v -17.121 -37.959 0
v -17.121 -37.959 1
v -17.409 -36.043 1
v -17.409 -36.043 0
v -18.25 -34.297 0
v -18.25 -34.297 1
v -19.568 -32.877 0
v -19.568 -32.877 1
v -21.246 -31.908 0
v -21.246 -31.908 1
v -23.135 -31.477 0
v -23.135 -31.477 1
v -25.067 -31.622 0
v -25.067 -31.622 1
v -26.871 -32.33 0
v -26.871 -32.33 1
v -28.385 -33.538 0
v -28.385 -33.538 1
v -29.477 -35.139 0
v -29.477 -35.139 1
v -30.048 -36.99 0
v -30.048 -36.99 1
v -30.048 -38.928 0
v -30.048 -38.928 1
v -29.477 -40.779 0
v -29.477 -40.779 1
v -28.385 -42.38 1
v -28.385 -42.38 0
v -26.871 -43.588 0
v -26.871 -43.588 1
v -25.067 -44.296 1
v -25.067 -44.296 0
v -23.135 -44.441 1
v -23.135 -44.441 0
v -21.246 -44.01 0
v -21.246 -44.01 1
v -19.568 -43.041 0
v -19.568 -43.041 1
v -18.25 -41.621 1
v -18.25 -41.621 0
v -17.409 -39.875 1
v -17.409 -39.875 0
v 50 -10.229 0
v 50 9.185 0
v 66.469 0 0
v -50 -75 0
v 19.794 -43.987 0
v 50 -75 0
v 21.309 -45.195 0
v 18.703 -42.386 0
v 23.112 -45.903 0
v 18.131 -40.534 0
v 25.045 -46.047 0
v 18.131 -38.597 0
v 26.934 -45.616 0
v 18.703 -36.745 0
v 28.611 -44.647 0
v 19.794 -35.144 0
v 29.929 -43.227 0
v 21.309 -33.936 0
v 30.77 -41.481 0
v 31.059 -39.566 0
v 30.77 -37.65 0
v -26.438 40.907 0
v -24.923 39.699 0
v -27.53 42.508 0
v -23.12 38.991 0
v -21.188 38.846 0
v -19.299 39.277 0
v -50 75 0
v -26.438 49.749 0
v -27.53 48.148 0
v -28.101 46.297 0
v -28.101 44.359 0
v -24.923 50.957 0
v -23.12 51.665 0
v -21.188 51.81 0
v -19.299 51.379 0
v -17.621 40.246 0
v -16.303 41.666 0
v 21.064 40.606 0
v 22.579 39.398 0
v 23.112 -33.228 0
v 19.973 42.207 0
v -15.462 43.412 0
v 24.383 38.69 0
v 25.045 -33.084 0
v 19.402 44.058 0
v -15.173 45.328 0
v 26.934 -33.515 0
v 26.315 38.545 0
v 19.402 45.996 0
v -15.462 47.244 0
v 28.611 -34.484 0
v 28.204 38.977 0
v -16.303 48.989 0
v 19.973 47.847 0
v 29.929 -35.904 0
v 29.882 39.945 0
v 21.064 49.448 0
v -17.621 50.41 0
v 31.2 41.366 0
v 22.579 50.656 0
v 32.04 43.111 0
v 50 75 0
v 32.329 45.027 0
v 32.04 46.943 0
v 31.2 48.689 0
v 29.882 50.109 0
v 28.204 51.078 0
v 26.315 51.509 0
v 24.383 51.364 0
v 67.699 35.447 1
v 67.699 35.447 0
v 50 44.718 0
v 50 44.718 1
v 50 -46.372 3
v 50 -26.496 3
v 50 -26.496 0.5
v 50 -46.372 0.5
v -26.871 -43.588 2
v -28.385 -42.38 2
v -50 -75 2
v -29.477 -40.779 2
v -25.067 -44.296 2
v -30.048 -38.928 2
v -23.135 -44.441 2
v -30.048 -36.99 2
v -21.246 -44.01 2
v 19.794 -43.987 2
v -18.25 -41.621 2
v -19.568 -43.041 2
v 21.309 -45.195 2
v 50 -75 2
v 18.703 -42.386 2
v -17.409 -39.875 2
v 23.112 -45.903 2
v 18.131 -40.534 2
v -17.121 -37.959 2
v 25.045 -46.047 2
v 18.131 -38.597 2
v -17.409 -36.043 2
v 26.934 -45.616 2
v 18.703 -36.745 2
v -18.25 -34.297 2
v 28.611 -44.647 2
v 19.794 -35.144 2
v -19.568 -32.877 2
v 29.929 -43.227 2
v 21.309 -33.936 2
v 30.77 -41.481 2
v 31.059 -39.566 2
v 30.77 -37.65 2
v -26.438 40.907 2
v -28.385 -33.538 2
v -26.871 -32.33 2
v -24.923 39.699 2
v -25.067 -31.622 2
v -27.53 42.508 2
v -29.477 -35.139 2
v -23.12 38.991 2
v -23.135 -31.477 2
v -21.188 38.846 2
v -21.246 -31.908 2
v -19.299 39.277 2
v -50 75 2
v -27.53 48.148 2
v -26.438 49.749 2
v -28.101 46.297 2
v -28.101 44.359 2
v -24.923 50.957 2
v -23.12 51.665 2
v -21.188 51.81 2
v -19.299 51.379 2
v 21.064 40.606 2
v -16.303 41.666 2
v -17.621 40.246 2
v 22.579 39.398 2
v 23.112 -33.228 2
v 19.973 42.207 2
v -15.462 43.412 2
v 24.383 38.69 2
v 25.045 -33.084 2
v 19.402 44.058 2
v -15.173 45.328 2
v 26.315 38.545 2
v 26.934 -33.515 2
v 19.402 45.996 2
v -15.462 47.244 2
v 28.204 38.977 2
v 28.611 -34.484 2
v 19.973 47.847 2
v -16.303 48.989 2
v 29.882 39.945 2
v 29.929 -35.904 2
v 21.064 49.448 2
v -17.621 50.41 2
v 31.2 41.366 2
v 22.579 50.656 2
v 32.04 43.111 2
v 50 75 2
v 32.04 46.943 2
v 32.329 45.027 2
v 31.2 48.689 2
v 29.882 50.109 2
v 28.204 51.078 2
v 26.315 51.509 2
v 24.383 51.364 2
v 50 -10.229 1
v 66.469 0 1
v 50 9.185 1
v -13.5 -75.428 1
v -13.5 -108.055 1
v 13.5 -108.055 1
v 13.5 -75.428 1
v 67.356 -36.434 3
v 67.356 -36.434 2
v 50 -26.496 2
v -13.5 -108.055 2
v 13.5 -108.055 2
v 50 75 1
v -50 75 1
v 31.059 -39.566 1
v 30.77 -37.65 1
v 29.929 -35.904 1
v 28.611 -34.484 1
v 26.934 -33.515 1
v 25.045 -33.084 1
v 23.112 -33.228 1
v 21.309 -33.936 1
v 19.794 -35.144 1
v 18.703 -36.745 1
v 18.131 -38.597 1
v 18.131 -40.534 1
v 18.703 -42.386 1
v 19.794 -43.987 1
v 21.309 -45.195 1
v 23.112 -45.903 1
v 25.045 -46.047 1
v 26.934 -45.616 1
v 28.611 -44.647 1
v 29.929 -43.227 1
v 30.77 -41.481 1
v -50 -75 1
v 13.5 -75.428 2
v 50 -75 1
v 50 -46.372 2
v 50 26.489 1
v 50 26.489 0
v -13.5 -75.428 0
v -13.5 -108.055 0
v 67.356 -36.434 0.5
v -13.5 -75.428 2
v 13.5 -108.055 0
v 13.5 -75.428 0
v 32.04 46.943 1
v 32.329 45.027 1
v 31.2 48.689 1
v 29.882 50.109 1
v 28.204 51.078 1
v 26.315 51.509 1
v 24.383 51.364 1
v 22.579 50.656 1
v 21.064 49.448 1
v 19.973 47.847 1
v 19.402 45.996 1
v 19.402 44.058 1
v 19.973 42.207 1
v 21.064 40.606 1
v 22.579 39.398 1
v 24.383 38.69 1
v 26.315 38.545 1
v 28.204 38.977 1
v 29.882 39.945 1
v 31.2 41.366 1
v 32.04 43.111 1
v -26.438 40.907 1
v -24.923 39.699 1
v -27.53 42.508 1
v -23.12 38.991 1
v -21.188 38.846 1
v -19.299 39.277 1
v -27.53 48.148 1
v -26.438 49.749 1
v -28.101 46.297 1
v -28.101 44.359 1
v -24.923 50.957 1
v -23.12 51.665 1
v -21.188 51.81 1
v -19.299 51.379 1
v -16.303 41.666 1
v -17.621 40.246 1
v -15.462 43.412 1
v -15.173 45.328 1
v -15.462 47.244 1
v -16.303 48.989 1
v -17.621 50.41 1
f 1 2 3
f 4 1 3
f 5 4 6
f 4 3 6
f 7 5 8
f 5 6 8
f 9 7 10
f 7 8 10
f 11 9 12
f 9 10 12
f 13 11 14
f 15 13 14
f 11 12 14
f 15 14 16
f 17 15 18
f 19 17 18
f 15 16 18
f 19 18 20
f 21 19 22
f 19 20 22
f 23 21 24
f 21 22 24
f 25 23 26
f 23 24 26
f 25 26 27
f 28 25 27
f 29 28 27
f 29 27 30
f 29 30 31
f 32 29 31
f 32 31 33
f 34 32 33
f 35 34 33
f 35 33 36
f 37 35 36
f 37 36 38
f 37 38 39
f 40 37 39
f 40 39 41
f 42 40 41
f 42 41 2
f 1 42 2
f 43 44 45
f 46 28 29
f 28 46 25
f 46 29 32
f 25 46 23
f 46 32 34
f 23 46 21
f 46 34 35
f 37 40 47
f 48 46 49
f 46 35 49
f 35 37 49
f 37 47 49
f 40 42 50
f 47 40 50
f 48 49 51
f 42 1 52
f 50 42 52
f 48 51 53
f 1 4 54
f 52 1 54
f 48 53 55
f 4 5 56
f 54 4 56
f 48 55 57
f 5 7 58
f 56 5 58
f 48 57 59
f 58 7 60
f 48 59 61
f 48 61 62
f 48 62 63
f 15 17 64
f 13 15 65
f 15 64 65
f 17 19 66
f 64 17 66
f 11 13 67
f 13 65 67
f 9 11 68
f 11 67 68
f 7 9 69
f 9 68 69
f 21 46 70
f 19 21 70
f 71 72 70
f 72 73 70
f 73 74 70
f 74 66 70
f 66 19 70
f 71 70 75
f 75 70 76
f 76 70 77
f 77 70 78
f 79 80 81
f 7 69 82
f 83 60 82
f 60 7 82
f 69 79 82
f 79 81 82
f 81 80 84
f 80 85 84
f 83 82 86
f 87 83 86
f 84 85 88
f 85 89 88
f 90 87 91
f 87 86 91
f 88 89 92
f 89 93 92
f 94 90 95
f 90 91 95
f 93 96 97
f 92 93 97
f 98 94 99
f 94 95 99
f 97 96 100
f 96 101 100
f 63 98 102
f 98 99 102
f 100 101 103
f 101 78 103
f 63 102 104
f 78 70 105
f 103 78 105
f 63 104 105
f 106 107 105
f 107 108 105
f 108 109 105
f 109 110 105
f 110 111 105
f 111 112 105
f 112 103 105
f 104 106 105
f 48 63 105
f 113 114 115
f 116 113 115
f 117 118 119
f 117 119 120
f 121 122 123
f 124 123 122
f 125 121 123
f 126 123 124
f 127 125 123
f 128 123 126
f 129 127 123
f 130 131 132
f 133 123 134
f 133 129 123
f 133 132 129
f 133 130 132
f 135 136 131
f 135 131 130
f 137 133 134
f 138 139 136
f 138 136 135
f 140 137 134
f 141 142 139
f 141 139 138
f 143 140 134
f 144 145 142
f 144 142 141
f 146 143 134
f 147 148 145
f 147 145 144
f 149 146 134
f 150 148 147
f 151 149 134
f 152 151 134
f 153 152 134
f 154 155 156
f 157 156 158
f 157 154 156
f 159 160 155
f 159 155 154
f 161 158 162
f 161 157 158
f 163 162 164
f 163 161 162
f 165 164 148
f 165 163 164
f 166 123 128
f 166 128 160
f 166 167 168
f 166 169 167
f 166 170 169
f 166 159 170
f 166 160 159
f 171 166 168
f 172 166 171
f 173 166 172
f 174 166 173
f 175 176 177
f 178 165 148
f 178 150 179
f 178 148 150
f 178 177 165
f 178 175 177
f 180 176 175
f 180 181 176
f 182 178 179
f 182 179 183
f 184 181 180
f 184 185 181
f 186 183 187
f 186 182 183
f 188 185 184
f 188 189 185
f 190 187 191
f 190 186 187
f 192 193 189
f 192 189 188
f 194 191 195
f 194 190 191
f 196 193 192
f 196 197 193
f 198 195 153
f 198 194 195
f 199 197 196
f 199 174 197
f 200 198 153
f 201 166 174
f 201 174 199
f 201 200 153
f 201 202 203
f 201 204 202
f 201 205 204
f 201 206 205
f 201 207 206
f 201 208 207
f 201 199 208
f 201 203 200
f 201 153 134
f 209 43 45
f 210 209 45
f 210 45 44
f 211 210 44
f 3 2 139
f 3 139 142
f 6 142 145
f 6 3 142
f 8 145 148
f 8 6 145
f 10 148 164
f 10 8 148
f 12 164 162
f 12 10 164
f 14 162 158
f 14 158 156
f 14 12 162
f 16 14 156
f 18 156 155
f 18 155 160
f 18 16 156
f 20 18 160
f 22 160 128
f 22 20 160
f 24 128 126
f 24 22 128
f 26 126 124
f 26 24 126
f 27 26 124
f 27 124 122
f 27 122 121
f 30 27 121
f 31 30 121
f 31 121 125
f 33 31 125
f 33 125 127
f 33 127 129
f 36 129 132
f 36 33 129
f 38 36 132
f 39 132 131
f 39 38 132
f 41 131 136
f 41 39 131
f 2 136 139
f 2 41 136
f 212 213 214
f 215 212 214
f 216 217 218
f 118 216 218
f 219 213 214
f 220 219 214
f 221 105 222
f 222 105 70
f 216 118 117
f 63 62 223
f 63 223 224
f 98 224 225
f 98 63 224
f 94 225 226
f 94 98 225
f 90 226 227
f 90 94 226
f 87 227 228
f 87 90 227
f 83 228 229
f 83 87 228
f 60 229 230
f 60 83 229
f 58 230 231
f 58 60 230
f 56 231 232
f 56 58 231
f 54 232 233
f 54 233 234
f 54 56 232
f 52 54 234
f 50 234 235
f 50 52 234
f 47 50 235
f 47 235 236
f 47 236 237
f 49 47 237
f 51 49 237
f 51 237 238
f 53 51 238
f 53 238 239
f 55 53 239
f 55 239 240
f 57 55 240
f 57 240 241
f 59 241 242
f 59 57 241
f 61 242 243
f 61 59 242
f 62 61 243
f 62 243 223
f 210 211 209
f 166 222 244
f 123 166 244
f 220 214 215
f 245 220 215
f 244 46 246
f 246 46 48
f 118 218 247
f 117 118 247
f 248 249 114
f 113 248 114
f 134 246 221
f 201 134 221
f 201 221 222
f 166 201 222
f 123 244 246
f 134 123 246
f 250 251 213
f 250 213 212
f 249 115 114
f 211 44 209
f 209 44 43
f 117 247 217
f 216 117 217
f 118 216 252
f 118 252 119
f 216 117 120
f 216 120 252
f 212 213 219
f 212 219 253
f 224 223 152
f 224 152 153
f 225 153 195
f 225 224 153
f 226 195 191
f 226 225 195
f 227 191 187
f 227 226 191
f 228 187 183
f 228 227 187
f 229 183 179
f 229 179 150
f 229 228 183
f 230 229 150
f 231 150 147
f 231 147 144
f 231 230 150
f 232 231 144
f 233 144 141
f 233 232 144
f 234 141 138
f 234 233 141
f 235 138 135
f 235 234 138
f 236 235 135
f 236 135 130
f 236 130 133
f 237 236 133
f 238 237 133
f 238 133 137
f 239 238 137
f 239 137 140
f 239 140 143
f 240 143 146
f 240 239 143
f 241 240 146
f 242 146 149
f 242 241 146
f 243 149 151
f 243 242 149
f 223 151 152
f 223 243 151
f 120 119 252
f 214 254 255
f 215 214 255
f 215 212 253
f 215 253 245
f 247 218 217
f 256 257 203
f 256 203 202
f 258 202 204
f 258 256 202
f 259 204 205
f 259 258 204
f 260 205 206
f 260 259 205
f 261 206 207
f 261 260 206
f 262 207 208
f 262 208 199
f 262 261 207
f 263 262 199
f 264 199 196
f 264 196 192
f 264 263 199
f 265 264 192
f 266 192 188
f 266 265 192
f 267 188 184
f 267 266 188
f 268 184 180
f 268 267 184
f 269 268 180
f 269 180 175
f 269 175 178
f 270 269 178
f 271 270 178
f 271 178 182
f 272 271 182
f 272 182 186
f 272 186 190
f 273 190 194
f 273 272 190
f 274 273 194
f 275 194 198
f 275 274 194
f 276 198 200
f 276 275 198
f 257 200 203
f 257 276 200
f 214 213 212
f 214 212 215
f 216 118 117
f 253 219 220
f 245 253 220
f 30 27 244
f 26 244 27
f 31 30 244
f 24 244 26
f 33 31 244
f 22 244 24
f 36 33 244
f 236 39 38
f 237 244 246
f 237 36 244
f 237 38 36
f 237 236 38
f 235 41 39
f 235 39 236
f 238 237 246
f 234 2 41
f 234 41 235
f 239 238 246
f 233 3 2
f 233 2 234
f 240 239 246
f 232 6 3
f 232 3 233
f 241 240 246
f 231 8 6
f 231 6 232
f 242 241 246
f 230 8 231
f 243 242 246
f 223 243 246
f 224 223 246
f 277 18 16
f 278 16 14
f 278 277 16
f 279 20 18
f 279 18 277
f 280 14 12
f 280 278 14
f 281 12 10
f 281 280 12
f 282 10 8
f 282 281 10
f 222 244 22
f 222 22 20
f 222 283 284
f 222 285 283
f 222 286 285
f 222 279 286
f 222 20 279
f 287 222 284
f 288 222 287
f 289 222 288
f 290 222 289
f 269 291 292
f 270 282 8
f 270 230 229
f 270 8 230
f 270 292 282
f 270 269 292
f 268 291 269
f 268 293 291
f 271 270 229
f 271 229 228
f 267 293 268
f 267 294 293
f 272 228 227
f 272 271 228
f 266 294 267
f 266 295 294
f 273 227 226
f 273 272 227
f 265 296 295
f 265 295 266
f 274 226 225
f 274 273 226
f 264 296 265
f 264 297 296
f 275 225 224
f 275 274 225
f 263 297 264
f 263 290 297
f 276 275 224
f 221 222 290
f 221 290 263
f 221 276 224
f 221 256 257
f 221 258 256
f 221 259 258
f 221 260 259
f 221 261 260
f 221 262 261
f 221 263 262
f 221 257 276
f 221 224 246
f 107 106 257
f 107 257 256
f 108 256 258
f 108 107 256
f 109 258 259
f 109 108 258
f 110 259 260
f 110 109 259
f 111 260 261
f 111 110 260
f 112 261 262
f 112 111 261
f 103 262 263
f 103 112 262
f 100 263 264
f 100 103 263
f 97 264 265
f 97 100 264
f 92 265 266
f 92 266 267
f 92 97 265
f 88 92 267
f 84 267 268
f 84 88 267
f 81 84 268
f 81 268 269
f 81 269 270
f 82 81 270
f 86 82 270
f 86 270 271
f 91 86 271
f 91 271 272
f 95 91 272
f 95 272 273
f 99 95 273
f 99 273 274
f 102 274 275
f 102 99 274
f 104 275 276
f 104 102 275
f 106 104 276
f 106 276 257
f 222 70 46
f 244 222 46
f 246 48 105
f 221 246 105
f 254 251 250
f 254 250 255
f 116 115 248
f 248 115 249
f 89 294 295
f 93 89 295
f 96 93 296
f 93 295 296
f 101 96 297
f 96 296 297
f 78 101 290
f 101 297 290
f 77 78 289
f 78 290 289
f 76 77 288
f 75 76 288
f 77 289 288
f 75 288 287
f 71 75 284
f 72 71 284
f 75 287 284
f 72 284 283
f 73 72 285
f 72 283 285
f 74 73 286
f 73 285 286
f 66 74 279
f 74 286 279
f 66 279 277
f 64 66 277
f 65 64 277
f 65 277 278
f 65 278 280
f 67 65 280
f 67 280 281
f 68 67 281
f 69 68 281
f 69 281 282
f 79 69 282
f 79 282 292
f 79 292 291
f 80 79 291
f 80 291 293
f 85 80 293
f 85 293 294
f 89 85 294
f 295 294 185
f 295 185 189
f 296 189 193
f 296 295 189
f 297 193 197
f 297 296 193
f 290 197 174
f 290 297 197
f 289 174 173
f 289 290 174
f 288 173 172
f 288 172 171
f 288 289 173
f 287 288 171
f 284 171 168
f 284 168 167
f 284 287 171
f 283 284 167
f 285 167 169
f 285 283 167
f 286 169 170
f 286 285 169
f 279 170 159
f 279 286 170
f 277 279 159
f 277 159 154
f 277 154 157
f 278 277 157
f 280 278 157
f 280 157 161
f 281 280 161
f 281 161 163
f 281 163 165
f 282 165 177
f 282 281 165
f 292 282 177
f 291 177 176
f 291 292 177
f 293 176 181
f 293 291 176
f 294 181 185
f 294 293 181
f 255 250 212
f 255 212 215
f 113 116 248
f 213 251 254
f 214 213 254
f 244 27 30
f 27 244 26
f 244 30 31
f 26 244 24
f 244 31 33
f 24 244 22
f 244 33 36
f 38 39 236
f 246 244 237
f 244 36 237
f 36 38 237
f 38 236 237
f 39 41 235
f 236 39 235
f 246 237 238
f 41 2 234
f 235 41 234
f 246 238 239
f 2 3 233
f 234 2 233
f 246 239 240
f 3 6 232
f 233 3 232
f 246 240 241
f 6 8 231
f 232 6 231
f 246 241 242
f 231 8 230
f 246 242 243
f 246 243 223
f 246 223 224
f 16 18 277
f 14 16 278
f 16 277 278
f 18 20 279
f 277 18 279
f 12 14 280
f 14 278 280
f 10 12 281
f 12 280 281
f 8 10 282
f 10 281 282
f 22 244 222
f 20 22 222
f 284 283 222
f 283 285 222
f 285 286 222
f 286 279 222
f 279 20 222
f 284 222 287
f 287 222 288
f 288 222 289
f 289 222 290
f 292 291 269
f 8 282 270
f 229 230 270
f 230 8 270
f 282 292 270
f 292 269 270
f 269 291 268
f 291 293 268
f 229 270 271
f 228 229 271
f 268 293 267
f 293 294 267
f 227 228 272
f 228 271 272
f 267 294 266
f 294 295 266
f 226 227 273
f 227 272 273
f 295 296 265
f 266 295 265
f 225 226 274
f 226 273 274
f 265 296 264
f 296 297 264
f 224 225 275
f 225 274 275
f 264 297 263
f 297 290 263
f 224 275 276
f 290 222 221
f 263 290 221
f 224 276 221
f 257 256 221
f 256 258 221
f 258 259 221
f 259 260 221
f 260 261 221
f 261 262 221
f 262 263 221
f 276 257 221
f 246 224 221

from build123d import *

# Parameters (mm, degrees)
F7_DEPTH  = 1
F5_R      = 6.5
F9_DEPTH  = 1
F10_DEPTH = 25
F11_R     = 6.5
F12_DEPTH = 25
F3_R      = 6.5
F13_DEPTH = 25
F14_R     = 6.5
F15_DEPTH = 25
F6_W      = 27
F6_H      = 32.6264798641
F16_DEPTH = 1
F17_DEPTH = 1
F19_DEPTH = 1
F20_DEPTH = 2.5


with BuildPart() as f7:
    # F1 (on face) → F7 (new body)
    with BuildSketch(Plane.XY):
        Polygon((67.6991255428, 35.4470872208), (50, 44.7180596117), (50, 26.4886961589), align=None)
    extrude(amount=F7_DEPTH)

    # F8 (on face) → F10 (cut)
    with BuildSketch(Plane.XY):
        Polygon((-50, -75), (50, -75), (50, -10.228929481), (50, 9.1847554396), (50, 75), (-50, 75), align=None)
    extrude(amount=-F10_DEPTH, mode=Mode.SUBTRACT)

    # F3 (on face) → F13 (cut)
    with BuildSketch(Plane.XY):
        with Locations((-21.6921102256, 45.2101491392)):
            Circle(F3_R)
    extrude(amount=-F13_DEPTH, mode=Mode.SUBTRACT)


with BuildPart() as f7b:
    # F2 (on face) → F7, piece 2 (new body)
    with BuildSketch(Plane.XY):
        Polygon((66.4692148566, 0), (50, 9.1847554396), (50, -10.228929481), align=None)
    extrude(amount=F7_DEPTH)


with BuildPart() as f9:
    # F5 (on face) → F9 (new body)
    with BuildSketch(Plane.XY):
        Polygon((-50, -75), (50, -75), (50, -10.228929481), (50, 9.1847554396), (50, 75), (-50, 75), align=None)
        with Locations((24.5588049293, -39.565525949)):
            Circle(F5_R, mode=Mode.SUBTRACT)
        with Locations((25.8289668709, 45.0272187591)):
            Circle(F5_R, mode=Mode.SUBTRACT)
    extrude(amount=F9_DEPTH)

    # F11 (on face) → F12 (cut)
    with BuildSketch(Plane.XY.offset(1)):
        with Locations((-21.6734521091, 45.3278496861)):
            Circle(F11_R)
    extrude(amount=-F12_DEPTH, mode=Mode.SUBTRACT)

    # F14 (on face) → F15 (cut)
    with BuildSketch(Plane.XY.offset(1)):
        with Locations((-23.6205700785, -37.958946079)):
            Circle(F14_R)
    extrude(amount=-F15_DEPTH, mode=Mode.SUBTRACT)


with BuildPart() as f16:
    # F6 (on face) → F16 (new body)
    with BuildSketch(Plane.XY):
        with Locations((0, -91.7416587472)):
            Rectangle(F6_W, F6_H)
    extrude(amount=F16_DEPTH)


with BuildPart() as f17:
    # F17 (new): a face of the model
    f17_faces = [f16.part.faces().sort_by_distance(p)[0] for p in [
        (0, -91.7416587472, 1),
    ]]
    extrude(f17_faces, amount=F17_DEPTH)


with BuildPart() as f17b:
    # F17#2 (new): a face of the model
    f17_2_faces = [f9.part.faces().sort_by_distance(p)[0] for p in [
        (-0.0467276065, -0.1177017141, 1),
    ]]
    extrude(f17_2_faces, amount=F17_DEPTH)


with BuildPart() as f19:
    # F18 (on face) → F19 (new body)
    with BuildSketch(Plane.XY.offset(2)):
        Polygon((67.3561024125, -36.4340830519), (50, -26.4959892181), (50, -46.3721768856), align=None)
    extrude(amount=F19_DEPTH)


with BuildPart() as f20:
    # F20 (new): a face of the model
    f20_faces = [f19.part.faces().sort_by_distance(p)[0] for p in [
        (55.7853674708, -36.4340830519, 3),
    ]]
    extrude(f20_faces, amount=-F20_DEPTH)


solid = Compound([f7.part, f7b.part, f9.part, f16.part, f17.part, f17b.part, f19.part, f20.part])
